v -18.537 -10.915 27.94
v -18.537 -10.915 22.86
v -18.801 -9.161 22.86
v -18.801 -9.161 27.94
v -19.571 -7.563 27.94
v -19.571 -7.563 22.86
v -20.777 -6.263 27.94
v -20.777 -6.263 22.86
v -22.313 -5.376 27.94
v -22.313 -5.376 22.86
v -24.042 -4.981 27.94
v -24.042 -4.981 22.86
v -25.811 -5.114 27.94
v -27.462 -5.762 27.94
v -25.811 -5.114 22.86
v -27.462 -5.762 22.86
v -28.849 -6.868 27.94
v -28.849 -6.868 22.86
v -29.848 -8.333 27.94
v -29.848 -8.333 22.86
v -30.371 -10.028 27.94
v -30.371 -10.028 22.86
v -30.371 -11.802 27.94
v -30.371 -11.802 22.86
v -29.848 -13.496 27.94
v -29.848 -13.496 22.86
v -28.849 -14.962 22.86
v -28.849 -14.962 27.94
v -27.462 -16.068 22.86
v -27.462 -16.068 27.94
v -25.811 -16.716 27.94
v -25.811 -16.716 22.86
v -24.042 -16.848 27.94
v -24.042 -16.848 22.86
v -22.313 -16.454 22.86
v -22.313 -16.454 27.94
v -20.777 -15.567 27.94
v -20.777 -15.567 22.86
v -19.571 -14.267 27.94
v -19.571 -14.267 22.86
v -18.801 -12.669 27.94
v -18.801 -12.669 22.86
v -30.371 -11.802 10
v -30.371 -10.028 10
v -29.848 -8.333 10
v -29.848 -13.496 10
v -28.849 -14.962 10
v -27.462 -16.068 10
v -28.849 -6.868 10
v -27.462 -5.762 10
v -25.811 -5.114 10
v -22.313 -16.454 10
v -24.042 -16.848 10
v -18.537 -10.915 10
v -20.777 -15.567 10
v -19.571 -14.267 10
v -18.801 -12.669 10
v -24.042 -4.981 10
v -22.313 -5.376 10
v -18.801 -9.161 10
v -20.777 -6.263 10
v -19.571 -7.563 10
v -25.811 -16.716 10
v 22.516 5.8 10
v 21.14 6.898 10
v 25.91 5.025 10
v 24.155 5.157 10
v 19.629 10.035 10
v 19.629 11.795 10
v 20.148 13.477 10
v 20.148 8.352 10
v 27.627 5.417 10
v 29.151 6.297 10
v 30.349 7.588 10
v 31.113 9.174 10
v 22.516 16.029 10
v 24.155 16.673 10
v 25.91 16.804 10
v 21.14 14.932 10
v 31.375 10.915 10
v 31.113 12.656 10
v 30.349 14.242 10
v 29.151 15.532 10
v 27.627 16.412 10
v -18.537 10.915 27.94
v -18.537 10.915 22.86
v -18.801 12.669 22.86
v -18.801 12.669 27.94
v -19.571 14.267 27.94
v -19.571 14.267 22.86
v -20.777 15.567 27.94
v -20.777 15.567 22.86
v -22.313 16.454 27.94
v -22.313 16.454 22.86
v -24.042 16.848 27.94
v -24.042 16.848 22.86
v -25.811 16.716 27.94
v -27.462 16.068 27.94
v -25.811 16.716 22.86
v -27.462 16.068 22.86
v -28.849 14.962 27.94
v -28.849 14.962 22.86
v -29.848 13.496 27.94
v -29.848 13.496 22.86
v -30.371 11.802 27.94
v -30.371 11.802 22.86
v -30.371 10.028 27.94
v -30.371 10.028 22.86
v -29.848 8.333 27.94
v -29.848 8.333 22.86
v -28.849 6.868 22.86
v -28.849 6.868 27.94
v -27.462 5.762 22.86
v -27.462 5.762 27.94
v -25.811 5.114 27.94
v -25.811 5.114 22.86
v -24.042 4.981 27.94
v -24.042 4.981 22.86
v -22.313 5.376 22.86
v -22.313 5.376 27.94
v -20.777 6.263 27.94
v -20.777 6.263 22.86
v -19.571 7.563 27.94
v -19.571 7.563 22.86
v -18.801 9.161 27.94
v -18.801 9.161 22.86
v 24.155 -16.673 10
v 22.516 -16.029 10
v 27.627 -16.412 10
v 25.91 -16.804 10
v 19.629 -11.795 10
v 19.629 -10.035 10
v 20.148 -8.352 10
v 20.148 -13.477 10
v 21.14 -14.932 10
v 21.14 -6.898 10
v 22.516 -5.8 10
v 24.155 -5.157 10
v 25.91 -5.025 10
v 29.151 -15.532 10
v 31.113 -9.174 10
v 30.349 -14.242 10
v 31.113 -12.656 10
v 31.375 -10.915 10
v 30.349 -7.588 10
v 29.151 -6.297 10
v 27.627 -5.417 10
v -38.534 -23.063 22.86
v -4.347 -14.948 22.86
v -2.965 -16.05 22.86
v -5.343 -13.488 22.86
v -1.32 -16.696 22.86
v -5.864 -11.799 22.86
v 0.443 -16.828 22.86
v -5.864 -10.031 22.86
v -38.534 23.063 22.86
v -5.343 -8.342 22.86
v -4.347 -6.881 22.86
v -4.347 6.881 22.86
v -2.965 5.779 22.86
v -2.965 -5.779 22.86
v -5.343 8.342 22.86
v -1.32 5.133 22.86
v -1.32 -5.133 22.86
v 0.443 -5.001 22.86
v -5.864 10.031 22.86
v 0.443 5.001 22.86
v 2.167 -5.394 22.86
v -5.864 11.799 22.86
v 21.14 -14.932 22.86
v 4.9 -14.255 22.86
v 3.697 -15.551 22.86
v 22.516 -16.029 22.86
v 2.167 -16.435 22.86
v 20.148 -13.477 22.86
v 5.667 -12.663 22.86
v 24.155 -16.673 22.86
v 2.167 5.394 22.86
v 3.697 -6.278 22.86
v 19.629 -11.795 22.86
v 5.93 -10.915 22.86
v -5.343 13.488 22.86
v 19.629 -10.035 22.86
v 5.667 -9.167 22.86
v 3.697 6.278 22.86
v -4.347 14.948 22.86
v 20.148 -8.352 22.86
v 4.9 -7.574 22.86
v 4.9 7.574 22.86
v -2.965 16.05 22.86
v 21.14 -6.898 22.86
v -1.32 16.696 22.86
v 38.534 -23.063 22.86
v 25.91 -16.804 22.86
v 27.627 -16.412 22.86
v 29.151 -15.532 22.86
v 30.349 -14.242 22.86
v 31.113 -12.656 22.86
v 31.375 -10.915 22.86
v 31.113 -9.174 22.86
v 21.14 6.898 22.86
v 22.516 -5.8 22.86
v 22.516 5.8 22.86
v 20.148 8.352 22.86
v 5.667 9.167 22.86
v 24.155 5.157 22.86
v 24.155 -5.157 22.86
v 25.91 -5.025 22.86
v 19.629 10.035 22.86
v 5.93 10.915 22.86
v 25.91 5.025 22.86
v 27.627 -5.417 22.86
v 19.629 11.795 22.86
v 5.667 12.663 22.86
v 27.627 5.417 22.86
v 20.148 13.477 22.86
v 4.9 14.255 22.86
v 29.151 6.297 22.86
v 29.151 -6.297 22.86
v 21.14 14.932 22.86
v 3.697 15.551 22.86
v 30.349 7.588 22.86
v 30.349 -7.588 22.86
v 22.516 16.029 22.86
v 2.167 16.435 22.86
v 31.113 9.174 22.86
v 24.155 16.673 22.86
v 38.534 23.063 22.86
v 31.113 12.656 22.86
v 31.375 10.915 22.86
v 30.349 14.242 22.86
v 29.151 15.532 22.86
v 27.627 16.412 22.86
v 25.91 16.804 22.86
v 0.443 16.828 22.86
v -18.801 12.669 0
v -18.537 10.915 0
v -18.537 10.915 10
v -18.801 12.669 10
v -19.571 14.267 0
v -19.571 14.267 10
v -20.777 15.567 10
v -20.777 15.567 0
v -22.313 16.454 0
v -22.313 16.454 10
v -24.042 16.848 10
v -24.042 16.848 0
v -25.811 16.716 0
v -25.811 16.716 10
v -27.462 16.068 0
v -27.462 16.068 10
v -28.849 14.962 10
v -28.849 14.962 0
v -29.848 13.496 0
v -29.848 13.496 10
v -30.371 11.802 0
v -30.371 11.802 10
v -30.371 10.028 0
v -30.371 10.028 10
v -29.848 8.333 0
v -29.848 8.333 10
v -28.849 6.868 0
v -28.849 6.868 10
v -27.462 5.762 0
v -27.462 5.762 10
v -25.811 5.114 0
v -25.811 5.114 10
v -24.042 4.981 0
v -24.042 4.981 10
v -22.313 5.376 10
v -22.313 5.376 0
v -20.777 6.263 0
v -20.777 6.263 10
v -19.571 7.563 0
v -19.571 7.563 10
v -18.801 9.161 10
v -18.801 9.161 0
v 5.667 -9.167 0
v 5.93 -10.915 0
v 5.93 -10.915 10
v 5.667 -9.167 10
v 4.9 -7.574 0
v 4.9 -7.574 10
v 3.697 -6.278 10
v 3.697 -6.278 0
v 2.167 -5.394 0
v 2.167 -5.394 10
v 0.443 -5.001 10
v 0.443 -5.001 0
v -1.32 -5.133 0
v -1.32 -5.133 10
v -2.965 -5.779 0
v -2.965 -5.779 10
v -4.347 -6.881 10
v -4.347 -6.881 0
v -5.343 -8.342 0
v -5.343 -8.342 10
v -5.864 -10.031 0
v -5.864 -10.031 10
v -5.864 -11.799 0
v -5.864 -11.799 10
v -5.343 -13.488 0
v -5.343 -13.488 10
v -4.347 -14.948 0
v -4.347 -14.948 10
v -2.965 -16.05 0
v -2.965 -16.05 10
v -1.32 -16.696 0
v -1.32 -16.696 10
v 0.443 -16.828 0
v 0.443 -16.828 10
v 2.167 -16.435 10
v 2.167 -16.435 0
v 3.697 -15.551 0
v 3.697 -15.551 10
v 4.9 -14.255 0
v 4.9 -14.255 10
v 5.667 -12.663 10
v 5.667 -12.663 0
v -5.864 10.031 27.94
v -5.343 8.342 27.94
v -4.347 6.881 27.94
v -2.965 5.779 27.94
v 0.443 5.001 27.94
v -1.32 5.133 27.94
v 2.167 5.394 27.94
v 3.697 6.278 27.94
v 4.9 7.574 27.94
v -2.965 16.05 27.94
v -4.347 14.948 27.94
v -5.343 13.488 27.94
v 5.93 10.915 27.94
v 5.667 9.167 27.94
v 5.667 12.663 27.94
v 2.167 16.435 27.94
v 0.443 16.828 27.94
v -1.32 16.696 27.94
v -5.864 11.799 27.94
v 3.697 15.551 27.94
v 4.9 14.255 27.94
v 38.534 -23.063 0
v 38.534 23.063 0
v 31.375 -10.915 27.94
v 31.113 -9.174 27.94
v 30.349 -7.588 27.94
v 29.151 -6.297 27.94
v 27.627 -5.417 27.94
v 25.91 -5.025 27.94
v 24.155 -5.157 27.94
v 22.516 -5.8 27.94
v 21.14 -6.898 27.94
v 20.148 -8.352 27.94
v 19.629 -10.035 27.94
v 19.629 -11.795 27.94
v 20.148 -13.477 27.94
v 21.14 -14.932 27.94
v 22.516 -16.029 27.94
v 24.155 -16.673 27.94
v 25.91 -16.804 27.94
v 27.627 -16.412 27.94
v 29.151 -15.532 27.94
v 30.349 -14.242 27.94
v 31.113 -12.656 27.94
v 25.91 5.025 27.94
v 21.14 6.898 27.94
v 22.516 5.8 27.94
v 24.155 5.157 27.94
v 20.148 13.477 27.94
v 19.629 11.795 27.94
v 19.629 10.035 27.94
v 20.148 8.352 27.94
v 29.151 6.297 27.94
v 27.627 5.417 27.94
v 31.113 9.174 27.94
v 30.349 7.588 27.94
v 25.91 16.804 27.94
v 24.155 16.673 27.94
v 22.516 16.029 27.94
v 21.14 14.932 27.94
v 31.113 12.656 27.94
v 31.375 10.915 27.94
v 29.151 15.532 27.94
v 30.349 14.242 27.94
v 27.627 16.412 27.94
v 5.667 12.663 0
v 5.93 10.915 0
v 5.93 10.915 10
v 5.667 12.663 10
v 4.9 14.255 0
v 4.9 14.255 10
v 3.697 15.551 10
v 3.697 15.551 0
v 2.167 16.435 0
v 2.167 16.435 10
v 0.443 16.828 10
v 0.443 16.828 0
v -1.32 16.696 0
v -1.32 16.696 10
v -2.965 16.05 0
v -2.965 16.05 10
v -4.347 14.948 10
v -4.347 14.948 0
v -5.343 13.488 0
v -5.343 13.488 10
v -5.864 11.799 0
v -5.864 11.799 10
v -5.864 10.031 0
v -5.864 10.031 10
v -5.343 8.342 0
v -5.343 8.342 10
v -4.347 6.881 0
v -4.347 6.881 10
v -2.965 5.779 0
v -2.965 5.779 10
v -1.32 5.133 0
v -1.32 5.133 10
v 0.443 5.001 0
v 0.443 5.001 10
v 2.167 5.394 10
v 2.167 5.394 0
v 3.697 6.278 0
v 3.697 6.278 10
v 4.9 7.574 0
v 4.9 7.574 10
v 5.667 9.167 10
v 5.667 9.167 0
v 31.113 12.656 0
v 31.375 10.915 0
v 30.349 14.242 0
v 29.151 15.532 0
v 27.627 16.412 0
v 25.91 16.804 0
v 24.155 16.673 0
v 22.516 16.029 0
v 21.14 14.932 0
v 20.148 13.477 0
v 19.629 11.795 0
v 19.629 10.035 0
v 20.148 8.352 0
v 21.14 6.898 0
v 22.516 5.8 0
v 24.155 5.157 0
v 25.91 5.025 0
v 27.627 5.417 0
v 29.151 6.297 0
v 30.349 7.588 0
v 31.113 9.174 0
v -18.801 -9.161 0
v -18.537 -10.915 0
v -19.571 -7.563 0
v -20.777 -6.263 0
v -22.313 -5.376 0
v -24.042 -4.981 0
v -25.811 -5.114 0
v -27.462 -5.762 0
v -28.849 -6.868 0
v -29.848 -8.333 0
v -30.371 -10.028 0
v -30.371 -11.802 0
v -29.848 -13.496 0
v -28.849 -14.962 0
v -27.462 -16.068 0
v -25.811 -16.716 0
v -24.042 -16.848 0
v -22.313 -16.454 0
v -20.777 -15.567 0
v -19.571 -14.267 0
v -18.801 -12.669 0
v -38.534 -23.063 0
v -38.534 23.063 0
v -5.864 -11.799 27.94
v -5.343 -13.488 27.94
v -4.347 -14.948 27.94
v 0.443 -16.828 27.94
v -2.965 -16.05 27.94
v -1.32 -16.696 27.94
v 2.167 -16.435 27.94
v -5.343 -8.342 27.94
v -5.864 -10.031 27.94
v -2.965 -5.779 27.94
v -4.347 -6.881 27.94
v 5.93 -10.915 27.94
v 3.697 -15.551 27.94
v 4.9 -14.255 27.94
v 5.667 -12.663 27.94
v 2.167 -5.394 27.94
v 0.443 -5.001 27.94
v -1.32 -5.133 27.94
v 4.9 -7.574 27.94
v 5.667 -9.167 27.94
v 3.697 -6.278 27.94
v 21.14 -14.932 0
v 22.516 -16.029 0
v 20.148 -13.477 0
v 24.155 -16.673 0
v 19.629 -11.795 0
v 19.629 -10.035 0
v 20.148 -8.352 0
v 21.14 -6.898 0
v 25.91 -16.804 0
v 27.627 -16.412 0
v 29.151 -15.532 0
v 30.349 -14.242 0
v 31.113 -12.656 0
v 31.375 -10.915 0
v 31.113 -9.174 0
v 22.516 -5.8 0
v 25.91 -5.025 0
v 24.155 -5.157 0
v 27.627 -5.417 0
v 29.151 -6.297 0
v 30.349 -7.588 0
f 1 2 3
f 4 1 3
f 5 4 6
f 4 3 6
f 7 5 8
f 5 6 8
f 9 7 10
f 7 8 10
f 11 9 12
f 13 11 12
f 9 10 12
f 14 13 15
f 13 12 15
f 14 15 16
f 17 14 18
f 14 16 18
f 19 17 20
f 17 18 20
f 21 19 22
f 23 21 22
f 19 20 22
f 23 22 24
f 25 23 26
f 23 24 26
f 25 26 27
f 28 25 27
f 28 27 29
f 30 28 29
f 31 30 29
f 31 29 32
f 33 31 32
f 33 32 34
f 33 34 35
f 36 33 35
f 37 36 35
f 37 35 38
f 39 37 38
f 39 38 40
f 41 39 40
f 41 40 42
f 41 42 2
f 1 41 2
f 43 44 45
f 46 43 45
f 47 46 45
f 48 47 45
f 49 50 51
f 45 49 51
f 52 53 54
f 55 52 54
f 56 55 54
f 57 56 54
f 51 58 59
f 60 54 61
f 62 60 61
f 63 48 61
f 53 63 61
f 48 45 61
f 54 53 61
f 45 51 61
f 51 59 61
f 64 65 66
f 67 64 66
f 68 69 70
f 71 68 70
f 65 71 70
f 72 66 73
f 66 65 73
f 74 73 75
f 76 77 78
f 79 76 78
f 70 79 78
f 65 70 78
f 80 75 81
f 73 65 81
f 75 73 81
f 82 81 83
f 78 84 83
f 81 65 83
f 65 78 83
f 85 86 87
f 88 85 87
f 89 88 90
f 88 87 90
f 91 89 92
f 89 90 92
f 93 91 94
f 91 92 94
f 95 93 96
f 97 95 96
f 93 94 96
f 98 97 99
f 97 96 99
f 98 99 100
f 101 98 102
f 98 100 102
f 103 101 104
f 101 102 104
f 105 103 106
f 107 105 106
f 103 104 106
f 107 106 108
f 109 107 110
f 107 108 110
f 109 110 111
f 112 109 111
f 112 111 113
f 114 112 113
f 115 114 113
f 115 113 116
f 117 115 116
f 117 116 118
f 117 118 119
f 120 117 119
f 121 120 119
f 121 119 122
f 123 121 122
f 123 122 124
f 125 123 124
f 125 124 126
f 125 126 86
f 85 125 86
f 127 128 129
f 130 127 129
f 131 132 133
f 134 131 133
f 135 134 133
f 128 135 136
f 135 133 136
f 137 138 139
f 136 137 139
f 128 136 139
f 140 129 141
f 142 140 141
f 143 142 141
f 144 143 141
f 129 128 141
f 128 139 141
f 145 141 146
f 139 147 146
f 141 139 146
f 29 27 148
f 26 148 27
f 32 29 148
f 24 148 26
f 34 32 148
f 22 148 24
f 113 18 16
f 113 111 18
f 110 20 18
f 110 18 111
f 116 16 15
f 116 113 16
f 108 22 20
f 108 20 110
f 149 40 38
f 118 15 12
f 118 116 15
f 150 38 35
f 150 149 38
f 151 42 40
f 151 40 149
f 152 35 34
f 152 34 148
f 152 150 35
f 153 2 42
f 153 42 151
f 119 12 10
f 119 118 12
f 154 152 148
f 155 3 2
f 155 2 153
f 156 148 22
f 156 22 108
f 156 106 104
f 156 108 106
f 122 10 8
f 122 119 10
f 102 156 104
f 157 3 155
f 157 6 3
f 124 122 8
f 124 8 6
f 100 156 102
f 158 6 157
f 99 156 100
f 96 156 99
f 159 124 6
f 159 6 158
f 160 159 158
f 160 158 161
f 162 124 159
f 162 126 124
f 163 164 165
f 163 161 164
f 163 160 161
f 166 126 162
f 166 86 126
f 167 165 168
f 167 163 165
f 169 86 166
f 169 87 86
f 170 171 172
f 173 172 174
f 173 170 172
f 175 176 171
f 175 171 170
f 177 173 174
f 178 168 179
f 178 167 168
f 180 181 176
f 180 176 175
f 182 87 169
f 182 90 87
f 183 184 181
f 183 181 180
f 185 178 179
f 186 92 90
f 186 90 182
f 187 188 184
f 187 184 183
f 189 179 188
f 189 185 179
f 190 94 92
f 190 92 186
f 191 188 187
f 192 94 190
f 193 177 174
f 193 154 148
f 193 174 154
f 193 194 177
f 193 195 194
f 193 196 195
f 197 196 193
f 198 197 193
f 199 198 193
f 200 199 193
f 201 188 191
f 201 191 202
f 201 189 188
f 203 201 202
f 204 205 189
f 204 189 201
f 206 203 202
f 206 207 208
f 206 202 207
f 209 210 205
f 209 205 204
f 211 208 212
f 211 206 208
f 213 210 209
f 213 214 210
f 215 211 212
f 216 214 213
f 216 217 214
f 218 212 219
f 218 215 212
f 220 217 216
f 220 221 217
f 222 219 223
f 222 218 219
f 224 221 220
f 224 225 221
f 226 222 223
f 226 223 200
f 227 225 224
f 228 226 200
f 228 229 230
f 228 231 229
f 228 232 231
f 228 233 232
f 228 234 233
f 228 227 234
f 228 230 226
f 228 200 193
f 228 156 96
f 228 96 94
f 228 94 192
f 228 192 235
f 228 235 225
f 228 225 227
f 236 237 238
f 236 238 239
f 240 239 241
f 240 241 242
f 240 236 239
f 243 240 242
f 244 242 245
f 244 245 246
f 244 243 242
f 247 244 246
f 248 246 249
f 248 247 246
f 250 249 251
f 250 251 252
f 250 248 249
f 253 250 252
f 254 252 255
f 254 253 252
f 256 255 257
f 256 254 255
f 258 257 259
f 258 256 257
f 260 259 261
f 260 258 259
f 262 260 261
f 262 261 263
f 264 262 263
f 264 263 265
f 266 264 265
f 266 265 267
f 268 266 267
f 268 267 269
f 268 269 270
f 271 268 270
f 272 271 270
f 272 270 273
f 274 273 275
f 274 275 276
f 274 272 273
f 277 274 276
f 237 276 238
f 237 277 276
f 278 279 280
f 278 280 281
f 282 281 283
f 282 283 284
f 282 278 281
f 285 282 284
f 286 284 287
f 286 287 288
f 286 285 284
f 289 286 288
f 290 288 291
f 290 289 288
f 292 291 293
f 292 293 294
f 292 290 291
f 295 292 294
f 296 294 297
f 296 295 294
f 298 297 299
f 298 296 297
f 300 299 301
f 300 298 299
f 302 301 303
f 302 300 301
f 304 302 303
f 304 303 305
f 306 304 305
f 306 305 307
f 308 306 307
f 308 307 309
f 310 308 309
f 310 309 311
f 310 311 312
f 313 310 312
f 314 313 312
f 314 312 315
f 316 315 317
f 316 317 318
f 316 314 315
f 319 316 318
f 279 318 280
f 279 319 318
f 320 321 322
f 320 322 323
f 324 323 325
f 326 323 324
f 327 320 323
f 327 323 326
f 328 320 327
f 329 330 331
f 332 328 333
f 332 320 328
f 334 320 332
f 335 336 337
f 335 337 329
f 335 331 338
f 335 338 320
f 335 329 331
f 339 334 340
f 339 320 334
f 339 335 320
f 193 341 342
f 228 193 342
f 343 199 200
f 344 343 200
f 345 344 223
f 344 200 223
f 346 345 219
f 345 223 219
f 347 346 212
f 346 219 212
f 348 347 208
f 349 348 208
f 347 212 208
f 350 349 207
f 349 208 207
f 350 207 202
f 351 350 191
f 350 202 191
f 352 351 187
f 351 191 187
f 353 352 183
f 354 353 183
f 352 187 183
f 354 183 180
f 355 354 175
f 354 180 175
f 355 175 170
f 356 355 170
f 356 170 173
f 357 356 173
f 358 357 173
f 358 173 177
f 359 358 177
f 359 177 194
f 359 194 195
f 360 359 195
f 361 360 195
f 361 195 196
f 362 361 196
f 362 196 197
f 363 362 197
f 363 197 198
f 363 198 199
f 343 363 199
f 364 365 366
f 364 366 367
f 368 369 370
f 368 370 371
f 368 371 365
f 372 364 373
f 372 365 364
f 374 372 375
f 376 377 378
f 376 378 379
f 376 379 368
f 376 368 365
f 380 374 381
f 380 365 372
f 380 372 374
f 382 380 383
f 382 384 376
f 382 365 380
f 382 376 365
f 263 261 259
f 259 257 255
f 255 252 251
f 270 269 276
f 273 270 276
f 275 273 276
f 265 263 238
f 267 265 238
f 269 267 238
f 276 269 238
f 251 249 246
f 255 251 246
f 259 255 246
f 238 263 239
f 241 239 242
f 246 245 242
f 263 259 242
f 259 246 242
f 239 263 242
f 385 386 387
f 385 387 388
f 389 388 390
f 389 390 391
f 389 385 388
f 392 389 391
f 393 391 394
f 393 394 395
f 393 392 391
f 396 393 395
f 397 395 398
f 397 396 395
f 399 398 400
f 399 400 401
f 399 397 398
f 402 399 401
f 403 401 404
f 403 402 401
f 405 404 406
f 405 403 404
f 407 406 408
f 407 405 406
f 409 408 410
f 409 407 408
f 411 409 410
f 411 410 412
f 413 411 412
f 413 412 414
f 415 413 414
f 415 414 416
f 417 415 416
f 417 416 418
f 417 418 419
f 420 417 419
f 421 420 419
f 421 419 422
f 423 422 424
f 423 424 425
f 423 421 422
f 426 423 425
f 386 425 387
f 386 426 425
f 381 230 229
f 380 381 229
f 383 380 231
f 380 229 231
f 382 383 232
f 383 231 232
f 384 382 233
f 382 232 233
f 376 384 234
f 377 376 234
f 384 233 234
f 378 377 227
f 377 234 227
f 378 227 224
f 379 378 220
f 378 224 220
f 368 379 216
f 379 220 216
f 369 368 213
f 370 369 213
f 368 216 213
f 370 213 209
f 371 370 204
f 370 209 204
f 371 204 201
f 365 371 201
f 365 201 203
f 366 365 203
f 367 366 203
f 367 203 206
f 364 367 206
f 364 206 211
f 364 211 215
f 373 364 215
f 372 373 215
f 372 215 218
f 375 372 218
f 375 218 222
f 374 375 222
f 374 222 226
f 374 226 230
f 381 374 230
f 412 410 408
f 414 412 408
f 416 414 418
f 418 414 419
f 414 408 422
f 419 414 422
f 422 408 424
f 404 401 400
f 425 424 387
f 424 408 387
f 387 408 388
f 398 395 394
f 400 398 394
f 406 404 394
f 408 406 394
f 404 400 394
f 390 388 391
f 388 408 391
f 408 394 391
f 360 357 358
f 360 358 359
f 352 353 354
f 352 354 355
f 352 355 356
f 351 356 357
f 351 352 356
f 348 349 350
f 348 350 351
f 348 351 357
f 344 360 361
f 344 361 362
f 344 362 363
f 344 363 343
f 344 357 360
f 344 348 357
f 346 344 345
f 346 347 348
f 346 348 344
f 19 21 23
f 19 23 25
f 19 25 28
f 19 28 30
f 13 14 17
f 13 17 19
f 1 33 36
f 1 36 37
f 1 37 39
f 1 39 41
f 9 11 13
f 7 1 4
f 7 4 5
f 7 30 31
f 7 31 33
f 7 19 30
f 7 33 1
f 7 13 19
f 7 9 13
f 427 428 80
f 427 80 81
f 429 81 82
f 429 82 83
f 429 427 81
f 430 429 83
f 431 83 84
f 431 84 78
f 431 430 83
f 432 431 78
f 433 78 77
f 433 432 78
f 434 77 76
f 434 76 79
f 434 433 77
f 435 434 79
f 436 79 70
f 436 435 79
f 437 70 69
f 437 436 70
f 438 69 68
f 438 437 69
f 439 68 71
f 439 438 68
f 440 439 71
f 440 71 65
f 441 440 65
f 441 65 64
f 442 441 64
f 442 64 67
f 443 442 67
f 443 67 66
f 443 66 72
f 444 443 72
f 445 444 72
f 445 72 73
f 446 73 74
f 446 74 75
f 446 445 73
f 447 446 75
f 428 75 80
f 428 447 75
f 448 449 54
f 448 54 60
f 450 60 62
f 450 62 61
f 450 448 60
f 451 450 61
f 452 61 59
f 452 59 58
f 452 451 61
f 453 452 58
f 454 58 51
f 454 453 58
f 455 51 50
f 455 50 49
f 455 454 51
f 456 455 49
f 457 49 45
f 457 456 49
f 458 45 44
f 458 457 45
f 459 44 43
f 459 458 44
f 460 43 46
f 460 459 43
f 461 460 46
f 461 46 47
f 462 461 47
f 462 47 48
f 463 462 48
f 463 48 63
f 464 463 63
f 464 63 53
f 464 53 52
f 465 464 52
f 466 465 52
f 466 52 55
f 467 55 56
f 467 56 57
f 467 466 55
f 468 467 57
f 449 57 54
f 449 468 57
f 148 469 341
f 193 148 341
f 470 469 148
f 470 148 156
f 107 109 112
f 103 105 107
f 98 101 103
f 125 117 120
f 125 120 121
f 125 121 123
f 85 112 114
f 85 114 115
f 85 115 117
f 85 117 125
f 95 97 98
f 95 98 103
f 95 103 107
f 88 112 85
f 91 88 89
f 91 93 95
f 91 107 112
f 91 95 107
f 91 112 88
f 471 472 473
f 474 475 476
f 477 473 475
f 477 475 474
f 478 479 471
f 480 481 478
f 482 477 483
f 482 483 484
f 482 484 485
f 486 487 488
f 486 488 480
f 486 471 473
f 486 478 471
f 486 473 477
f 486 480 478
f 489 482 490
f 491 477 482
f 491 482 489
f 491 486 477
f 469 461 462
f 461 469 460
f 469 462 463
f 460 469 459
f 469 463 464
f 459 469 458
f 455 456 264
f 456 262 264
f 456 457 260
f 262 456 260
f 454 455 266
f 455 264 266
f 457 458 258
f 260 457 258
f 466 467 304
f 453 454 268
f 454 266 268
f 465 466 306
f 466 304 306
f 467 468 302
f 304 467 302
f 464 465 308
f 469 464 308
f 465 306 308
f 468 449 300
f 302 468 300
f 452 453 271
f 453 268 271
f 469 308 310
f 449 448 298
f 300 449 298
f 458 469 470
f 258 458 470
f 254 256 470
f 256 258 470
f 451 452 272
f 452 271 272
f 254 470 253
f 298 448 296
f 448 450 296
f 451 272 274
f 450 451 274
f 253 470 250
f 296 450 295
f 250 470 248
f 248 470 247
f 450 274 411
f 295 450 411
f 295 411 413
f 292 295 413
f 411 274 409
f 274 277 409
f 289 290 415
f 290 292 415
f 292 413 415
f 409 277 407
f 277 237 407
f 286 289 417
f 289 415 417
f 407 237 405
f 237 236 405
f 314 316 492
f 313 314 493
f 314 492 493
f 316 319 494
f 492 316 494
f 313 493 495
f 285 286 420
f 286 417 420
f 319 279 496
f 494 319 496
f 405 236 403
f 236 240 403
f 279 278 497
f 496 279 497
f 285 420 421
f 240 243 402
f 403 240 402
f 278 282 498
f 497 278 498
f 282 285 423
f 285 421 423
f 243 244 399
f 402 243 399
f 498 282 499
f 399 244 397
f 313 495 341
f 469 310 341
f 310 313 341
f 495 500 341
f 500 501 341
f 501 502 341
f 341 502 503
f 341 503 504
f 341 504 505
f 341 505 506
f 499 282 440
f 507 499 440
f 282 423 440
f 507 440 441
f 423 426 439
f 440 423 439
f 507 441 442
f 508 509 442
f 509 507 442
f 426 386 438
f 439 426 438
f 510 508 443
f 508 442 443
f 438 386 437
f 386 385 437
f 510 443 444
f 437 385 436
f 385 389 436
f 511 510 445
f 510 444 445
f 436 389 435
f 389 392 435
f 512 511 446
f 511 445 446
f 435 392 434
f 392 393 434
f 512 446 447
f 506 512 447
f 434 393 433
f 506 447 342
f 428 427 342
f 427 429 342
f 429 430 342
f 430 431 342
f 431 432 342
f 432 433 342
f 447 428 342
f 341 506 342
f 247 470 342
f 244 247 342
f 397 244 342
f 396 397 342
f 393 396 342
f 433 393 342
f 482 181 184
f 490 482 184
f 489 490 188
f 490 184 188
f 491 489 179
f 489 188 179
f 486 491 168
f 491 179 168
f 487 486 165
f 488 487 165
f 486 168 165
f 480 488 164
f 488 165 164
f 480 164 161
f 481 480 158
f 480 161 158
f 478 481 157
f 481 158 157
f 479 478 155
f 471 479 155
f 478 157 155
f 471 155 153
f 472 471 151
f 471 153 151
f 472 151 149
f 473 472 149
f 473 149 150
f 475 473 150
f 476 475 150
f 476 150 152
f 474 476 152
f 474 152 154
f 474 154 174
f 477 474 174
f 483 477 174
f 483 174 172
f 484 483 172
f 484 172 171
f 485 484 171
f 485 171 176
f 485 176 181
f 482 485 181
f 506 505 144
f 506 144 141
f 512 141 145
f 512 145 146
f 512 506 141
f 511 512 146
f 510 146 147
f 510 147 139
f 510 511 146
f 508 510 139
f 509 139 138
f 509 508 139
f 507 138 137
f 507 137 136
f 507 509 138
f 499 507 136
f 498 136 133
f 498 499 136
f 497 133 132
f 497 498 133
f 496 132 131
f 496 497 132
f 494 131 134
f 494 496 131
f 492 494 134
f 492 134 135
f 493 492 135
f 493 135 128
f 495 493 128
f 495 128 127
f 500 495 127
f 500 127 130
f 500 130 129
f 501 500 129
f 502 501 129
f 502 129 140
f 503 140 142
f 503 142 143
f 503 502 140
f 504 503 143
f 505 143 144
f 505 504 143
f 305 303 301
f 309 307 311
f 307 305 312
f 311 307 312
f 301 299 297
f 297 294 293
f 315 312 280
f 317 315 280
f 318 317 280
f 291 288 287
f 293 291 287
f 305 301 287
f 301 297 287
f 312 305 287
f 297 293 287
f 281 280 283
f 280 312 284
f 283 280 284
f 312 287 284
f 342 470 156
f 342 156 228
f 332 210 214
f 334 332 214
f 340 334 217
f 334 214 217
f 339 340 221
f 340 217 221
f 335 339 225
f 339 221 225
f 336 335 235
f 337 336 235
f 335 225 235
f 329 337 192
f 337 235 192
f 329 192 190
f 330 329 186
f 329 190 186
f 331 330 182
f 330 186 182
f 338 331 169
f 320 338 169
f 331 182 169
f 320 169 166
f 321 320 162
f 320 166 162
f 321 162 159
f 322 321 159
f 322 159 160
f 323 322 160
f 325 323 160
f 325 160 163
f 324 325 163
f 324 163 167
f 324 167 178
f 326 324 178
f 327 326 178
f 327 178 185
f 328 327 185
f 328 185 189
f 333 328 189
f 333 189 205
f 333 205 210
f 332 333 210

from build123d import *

# Parameters (mm, degrees)
F0_W     = 77.067762
F0_H     = 46.12676
F0_R     = 5.950275
F0_R_2   = 5.930231
F0_R_3   = 5.905875
F1_DEPTH = 22.86
F2_DEPTH = 27.94
F3_DEPTH = 27.94
F4_DEPTH = 10


with BuildPart() as f1:
    # F0 (on Top) → F1 (new body)
    with BuildSketch(Plane.XY):
        Rectangle(F0_W, F0_H)
        with Locations((-24.487047, -10.914768)):
            Circle(F0_R, mode=Mode.SUBTRACT)
        with Locations((0, -10.914768)):
            Circle(F0_R_2, mode=Mode.SUBTRACT)
        with Locations((25.469103, -10.914768)):
            Circle(F0_R_3, mode=Mode.SUBTRACT)
        with Locations((-24.487047, 10.914768)):
            Circle(F0_R, mode=Mode.SUBTRACT)
        with Locations((0, 10.914768)):
            Circle(F0_R_2, mode=Mode.SUBTRACT)
        with Locations((25.469103, 10.914768)):
            Circle(F0_R_3, mode=Mode.SUBTRACT)
    extrude(amount=F1_DEPTH)

    # F0 (on Top) → F2 (join)
    with BuildSketch(Plane.XY):
        with Locations((-24.487047, 10.914768)):
            Circle(F0_R)
        with Locations((0, 10.914768)):
            Circle(F0_R_2)
        with Locations((25.469103, 10.914768)):
            Circle(F0_R_3)
        with Locations((25.469103, -10.914768)):
            Circle(F0_R_3)
        with Locations((0, -10.914768)):
            Circle(F0_R_2)
        with Locations((-24.487047, -10.914768)):
            Circle(F0_R)
    extrude(amount=F2_DEPTH)

    # F0 (on Top) → F3 (join, through all)
    with BuildSketch(Plane.XY):
        with Locations((-24.487047, 10.914768)):
            Circle(F0_R)
        with Locations((-24.487047, -10.914768)):
            Circle(F0_R)
        with Locations((0, -10.914768)):
            Circle(F0_R_2)
        with Locations((0, 10.914768)):
            Circle(F0_R_2)
        with Locations((25.469103, 10.914768)):
            Circle(F0_R_3)
        with Locations((25.469103, -10.914768)):
            Circle(F0_R_3)
    extrude(amount=F3_DEPTH)

    # F0 (on Top) → F4 (cut)
    with BuildSketch(Plane.XY):
        with Locations((-24.487047, -10.914768)):
            Circle(F0_R)
        with Locations((0, -10.914768)):
            Circle(F0_R_2)
        with Locations((25.469103, -10.914768)):
            Circle(F0_R_3)
        with Locations((25.469103, 10.914768)):
            Circle(F0_R_3)
        with Locations((0, 10.914768)):
            Circle(F0_R_2)
        with Locations((-24.487047, 10.914768)):
            Circle(F0_R)
    extrude(amount=F4_DEPTH, mode=Mode.SUBTRACT)


solid = f1.part
